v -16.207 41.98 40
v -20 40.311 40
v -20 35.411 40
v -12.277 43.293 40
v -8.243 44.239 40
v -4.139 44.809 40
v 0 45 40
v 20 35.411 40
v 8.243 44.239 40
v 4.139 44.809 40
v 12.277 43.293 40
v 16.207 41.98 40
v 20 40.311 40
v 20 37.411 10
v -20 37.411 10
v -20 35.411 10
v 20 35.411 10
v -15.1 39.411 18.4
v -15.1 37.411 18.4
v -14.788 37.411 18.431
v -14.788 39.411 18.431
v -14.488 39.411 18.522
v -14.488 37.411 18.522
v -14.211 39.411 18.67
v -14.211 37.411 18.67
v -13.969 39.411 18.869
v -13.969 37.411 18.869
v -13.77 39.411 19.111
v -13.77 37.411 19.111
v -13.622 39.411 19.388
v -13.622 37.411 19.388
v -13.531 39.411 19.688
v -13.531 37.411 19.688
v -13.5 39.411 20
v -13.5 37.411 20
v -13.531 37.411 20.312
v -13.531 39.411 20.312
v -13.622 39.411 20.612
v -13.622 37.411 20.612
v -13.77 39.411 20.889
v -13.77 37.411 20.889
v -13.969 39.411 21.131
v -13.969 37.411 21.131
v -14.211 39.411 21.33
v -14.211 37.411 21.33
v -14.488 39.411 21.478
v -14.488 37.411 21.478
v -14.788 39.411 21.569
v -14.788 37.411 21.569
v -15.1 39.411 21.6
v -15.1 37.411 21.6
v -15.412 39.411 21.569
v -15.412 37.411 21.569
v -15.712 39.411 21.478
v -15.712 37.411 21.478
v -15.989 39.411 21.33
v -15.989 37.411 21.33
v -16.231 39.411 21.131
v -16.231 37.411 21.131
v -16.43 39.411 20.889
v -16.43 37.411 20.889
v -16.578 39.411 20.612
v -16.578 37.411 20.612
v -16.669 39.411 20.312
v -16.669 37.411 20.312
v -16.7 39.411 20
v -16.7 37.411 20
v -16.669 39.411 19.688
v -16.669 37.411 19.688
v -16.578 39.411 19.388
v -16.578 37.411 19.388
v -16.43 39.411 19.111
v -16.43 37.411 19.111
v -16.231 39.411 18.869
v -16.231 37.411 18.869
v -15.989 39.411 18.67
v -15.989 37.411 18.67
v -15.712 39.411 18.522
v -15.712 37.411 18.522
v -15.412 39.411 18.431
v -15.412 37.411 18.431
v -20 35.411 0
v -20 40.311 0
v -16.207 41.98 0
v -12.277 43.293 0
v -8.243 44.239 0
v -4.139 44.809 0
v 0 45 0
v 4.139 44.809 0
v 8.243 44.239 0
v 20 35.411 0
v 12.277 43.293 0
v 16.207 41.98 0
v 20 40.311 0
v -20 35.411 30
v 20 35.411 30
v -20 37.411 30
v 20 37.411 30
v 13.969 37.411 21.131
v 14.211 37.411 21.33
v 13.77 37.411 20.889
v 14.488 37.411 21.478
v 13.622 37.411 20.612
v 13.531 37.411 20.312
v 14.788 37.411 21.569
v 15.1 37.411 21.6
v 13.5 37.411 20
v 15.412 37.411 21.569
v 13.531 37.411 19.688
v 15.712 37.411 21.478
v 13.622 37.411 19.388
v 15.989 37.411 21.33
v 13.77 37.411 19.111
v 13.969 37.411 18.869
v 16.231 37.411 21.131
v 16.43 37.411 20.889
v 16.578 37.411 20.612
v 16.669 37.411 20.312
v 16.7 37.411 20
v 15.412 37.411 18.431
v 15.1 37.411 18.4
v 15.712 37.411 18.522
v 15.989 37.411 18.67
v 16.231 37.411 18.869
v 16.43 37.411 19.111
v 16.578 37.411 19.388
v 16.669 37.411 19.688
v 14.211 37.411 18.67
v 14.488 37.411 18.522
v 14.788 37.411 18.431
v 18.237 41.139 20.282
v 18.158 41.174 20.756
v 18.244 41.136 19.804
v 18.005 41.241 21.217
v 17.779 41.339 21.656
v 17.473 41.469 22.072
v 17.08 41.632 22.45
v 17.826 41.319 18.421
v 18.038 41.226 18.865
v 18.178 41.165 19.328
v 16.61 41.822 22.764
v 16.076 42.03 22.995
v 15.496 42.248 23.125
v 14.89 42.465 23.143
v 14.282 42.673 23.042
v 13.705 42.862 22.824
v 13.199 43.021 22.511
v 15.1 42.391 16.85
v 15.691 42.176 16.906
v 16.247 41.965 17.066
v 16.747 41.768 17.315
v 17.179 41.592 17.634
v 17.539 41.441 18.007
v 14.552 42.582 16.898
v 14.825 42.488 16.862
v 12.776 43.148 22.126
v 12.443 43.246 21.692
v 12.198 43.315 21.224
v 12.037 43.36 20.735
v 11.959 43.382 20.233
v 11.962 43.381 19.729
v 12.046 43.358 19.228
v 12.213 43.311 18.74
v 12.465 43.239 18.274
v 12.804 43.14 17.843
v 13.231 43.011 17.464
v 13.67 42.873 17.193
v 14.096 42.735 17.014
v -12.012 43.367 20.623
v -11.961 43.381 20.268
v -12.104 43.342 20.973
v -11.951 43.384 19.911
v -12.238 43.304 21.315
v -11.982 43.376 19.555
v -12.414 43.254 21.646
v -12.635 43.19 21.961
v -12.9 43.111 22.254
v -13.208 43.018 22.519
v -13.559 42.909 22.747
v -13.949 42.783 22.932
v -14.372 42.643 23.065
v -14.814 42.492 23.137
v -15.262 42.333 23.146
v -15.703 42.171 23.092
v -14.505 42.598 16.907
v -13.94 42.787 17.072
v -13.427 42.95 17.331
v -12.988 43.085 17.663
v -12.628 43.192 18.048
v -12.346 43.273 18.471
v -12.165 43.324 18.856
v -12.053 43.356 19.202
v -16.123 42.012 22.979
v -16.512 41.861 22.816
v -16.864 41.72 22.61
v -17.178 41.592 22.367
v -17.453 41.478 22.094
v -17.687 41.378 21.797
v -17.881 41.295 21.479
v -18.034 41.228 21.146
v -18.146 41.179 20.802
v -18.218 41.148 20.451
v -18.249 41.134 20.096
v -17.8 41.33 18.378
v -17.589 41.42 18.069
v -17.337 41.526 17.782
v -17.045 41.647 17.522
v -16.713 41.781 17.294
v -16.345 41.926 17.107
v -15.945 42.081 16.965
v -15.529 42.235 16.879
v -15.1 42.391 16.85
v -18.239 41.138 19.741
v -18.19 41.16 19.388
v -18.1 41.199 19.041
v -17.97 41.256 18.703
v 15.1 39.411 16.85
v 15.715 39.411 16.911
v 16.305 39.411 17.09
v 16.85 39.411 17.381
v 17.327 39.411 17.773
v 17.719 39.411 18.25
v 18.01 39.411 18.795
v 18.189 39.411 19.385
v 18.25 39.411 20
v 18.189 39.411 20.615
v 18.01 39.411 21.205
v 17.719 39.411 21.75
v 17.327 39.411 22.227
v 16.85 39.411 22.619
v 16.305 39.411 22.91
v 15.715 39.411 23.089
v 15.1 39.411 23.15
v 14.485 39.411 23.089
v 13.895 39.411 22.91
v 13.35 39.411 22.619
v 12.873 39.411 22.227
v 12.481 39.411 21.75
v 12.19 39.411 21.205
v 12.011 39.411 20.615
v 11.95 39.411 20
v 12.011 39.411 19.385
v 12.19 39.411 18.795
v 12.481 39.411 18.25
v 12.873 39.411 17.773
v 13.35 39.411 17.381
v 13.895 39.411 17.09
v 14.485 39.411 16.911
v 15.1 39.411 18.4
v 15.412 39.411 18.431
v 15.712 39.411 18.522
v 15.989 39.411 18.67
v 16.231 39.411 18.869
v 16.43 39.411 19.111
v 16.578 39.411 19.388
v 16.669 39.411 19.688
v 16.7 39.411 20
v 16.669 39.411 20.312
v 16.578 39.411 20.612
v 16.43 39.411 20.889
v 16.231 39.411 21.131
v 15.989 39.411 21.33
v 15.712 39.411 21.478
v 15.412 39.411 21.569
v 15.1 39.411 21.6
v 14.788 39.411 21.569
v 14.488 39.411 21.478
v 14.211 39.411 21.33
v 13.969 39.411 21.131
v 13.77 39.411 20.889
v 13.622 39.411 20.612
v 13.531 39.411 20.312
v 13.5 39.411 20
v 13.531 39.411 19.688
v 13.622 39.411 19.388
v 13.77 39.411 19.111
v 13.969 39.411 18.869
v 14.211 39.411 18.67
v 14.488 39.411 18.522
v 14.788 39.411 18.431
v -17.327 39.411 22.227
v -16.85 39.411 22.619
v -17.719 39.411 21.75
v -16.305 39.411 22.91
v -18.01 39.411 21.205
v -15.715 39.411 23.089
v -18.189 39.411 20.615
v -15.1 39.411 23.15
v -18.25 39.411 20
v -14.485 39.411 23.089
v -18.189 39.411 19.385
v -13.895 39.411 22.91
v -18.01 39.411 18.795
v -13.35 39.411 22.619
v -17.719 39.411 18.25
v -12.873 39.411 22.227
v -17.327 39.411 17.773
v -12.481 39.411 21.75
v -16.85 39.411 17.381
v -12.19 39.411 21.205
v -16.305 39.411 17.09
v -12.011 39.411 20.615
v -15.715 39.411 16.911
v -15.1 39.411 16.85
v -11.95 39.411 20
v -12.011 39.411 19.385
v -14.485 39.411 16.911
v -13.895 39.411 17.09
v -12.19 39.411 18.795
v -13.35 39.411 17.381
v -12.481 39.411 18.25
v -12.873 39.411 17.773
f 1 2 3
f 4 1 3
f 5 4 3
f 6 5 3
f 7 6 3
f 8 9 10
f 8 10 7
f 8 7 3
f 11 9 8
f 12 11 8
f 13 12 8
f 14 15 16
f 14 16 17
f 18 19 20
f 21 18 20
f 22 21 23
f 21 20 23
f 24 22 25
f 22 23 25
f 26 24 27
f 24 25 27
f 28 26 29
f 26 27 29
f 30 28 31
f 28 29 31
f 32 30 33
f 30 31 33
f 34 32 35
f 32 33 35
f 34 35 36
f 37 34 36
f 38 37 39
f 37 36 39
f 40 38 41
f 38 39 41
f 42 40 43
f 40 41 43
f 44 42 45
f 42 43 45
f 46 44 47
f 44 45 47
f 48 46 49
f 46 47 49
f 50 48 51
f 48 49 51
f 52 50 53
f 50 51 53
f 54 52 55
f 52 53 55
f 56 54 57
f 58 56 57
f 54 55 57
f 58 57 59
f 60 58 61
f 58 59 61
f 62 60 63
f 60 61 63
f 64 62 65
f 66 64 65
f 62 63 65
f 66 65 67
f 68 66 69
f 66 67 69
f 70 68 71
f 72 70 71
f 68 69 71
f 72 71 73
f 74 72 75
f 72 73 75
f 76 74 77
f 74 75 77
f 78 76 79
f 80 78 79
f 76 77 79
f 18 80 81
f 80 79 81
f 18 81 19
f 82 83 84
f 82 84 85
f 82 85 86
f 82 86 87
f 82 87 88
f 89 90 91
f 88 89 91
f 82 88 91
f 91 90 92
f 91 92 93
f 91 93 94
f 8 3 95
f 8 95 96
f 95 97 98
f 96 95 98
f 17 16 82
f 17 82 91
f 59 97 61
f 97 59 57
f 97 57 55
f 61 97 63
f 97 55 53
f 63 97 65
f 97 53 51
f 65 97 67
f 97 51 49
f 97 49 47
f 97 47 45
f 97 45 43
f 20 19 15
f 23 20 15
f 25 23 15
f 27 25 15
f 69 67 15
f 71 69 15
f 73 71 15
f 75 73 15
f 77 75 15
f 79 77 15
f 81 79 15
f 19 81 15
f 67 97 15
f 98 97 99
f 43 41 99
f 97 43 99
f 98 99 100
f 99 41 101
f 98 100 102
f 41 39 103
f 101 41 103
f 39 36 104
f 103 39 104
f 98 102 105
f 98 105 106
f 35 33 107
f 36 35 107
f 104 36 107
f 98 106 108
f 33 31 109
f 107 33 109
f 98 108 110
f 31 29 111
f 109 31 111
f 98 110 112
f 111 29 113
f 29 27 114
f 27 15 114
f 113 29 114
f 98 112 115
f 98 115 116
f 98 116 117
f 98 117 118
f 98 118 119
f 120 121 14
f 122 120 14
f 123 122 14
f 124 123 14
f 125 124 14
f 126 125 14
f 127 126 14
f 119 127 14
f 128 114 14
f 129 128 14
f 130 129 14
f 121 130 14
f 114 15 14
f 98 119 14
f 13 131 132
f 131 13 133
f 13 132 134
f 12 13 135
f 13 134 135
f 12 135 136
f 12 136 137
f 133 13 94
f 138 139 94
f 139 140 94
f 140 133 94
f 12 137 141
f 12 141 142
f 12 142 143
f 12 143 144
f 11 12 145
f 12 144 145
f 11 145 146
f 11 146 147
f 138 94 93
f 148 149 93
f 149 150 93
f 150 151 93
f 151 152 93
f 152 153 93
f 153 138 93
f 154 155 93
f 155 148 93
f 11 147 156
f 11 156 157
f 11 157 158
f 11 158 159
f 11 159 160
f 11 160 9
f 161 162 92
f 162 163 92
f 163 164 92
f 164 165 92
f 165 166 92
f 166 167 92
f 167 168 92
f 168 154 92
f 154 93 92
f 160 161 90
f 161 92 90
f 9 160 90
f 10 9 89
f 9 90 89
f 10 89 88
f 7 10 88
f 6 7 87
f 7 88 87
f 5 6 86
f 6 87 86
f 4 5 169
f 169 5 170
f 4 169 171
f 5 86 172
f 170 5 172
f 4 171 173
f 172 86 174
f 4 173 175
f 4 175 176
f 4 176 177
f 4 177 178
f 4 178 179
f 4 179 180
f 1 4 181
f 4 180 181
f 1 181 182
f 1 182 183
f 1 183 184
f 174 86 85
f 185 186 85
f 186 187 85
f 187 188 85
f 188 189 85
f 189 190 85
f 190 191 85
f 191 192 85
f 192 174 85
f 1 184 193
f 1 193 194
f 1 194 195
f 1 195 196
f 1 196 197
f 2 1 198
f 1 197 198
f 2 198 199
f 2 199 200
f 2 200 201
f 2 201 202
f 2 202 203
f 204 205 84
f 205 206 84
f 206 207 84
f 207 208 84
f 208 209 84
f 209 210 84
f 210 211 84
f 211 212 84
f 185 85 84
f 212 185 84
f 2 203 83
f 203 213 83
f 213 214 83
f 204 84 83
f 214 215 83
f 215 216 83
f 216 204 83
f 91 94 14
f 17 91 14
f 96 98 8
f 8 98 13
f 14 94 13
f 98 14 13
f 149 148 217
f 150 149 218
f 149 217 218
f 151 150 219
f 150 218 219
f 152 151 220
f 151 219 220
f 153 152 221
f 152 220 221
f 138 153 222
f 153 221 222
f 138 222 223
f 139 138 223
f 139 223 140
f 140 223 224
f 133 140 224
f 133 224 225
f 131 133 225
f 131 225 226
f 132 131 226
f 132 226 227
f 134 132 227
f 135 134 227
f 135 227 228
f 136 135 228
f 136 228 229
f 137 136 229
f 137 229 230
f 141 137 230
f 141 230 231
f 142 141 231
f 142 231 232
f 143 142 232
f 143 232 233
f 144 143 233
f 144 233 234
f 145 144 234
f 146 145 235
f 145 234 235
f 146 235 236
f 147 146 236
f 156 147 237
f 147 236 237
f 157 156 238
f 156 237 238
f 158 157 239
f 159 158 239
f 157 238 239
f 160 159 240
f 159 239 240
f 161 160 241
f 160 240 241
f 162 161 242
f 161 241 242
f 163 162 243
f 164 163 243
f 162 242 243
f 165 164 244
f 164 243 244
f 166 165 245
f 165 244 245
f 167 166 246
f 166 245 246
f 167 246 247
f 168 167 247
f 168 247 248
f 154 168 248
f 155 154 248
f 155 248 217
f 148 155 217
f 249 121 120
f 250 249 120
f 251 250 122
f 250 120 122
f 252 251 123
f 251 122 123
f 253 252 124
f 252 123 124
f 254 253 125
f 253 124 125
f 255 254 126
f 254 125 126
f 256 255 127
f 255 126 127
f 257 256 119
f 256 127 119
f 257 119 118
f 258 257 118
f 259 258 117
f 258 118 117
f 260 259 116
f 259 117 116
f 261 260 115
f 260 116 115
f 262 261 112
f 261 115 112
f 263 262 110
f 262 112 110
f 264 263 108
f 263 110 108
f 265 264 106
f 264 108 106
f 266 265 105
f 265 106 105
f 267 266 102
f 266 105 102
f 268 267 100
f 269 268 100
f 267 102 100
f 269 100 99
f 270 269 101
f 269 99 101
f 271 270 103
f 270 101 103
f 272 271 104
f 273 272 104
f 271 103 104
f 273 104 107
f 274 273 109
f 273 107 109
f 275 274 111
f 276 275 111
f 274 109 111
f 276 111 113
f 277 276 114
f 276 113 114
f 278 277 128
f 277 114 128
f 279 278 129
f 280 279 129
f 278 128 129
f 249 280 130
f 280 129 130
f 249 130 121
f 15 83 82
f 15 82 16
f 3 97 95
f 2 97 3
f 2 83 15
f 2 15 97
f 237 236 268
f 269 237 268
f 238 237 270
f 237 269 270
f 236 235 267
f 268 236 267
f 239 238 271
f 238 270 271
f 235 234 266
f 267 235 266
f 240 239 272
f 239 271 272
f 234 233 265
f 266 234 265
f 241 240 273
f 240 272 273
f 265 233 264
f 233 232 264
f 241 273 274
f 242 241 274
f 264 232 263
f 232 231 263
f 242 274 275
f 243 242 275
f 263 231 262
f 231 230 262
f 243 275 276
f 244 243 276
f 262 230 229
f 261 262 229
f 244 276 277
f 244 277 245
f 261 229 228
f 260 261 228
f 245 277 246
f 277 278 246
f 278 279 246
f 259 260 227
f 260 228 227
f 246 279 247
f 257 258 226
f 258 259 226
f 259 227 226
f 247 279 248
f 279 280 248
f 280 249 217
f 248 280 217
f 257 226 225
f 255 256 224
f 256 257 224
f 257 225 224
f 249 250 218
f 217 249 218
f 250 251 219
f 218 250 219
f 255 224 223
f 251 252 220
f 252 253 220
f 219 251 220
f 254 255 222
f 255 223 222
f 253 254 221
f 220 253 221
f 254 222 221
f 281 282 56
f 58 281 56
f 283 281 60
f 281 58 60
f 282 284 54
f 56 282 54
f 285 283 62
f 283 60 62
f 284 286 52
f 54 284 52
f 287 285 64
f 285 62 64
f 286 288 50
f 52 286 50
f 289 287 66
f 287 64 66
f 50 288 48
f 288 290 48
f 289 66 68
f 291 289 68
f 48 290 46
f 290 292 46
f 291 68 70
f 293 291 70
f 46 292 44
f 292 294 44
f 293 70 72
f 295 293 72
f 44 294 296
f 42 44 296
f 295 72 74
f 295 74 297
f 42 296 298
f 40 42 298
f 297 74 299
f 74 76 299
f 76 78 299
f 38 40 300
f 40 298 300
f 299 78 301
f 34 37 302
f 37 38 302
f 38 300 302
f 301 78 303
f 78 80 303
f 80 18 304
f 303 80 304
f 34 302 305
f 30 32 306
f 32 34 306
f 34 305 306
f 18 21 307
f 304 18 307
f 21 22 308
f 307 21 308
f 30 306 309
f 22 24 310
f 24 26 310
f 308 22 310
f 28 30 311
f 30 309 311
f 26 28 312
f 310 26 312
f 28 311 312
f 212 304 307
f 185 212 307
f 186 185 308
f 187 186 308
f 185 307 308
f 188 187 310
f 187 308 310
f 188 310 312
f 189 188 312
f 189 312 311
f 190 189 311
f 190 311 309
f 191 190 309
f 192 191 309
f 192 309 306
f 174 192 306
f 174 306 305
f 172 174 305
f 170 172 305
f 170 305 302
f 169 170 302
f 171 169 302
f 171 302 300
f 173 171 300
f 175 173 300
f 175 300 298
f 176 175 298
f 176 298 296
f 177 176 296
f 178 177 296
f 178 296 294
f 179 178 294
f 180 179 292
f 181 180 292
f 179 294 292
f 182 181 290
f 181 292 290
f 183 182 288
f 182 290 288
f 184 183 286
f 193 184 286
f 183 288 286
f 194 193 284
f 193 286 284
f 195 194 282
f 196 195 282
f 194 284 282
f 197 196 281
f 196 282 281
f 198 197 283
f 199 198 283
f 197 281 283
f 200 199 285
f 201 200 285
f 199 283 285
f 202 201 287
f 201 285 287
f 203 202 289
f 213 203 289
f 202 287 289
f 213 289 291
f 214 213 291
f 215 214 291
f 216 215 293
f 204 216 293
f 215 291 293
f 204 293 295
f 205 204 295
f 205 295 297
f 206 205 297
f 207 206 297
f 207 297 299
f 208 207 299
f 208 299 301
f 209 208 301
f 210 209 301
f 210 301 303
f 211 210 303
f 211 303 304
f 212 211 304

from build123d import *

# Parameters (mm, degrees)
RESSALTO_EXTRUS_O1_DEPTH   = 40
ESBO_O2_R                  = 1.6
CORTE_EXTRUS_O1_DEPTH      = 2
CORTE_EXTRUS_O2_REACH      = 47.069
CORTE_EXTRUS_O2_END_RADIUS = 45
ESBO_O3_R                  = 3.15
ESBO_O4_W                  = 40
ESBO_O4_H                  = 10
RESSALTO_EXTRUS_O2_DEPTH   = 2


with BuildPart() as part:
    # Esboço1 → Ressalto-extrusão1 (new body)
    with BuildSketch(Plane.XY):
        with BuildLine():
            Line((-20, 40.311288741), (-20, 37.411288741))
            Line((-20, 37.411288741), (20, 37.411288741))
            Line((20, 37.411288741), (20, 40.311288741))
            ThreePointArc((20, 40.311288741), (0, 45), (-20, 40.311288741))
        make_face()
    extrude(amount=RESSALTO_EXTRUS_O1_DEPTH)

    # Esboço2 → Corte-extrusão1 (cut)
    with BuildSketch(Plane.XZ.offset(-37.411288741)):
        with Locations(Location((15.1, 20, 0), (0, 0, 270))):
            Circle(ESBO_O2_R)
        with Locations(Location((-15.1, 20, 0), (0, 0, 270))):
            Circle(ESBO_O2_R)
    extrude(amount=-CORTE_EXTRUS_O1_DEPTH, mode=Mode.SUBTRACT)

    # Corte-extrusão2: up to this cylinder (the profile starts inside it)
    corte_extrus_o2_end = Plane(origin=(0, 0, 20), z_dir=(0, 0, -1)) * Cylinder(CORTE_EXTRUS_O2_END_RADIUS, 185.138, mode=Mode.PRIVATE)
    # Esboço3 → Corte-extrusão2 (cut, up to the surface)
    with BuildSketch(Plane.XZ.offset(-39.411288741), mode=Mode.PRIVATE) as corte_extrus_o2_sk1:
        with Locations(Location((15.1, 20, 0), (0, 0, 270))):
            Circle(ESBO_O3_R)
    corte_extrus_o2_tool1 = extrude(corte_extrus_o2_sk1.sketch, amount=-CORTE_EXTRUS_O2_REACH, mode=Mode.PRIVATE) & corte_extrus_o2_end
    add(corte_extrus_o2_tool1.solids().sort_by_distance((15.1, 39.411289, 20))[0], mode=Mode.SUBTRACT)
    # Esboço3 → Corte-extrusão2 (cut, up to the surface)
    with BuildSketch(Plane.XZ.offset(-39.411288741), mode=Mode.PRIVATE) as corte_extrus_o2_sk2:
        with Locations(Location((-15.1, 20, 0), (0, 0, 270))):
            Circle(ESBO_O3_R)
    corte_extrus_o2_tool2 = extrude(corte_extrus_o2_sk2.sketch, amount=-CORTE_EXTRUS_O2_REACH, mode=Mode.PRIVATE) & corte_extrus_o2_end
    add(corte_extrus_o2_tool2.solids().sort_by_distance((-15.1, 39.411289, 20))[0], mode=Mode.SUBTRACT)

    # Esboço4 → Ressalto-extrusão2 (add)
    with BuildSketch(Plane.XZ.offset(-37.411288741)):
        with Locations((0, 35)):
            Rectangle(ESBO_O4_W, ESBO_O4_H)
        with Locations((0, 5)):
            Rectangle(ESBO_O4_W, ESBO_O4_H)
    extrude(amount=RESSALTO_EXTRUS_O2_DEPTH)


solid = part.part
